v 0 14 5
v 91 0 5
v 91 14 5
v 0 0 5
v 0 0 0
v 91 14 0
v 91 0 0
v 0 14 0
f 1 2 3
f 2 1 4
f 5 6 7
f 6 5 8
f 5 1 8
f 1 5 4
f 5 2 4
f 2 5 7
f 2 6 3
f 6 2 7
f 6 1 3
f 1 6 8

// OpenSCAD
translate([3.5, 5.5, 2.5]) color([0.09890076646638046, 0.7328850061793606, 0.2487736956630997]) cube([7, 11, 5], center=true);
translate([10.5, 5.5, 2.5]) color([0.28455698400578255, 0.7360834330107994, 0.6596207917216363]) cube([7, 11, 5], center=true);
translate([17.5, 5.5, 2.5]) color([0.7419215555155583, 0.5152830587943614, 0.8590958196652707]) cube([7, 11, 5], center=true);
translate([24.5, 5.5, 2.5]) color([0.12179389137547159, 0.6451969614065052, 0.11824431248865597]) cube([7, 11, 5], center=true);
translate([31.5, 5.5, 2.5]) color([0.7372833681454282, 0.3589046614584527, 0.67488210437111]) cube([7, 11, 5], center=true);
translate([38.5, 5.5, 2.5]) color([0.7034839134412817, 0.6606084576410584, 0.22155798032782648]) cube([7, 11, 5], center=true);
translate([45.5, 5.5, 2.5]) color([0.8317998863873537, 0.24013608742346748, 0.5181532972121122]) cube([7, 11, 5], center=true);
translate([52.5, 5.5, 2.5]) color([0.6746457541533513, 0.23360317478475656, 0.628511722983939]) cube([7, 11, 5], center=true);
translate([59.5, 5.5, 2.5]) color([0.2868310479973286, 0.1713823760843869, 0.809748828526577]) cube([7, 11, 5], center=true);
translate([66.5, 5.5, 2.5]) color([0.5531227700773604, 0.32788470660885605, 0.5854309472055399]) cube([7, 11, 5], center=true);
translate([73.5, 5.5, 2.5]) color([0.025286397427288332, 0.12982285676032723, 0.3955808516982431]) cube([7, 11, 5], center=true);
translate([80.5, 5.5, 2.5]) color([0.9757565794644123, 0.5104745178761232, 0.07645620506689521]) cube([7, 11, 5], center=true);
translate([87.5, 5.5, 2.5]) color([0.7650406152494567, 0.7814438709253152, 0.7748021743948562]) cube([7, 11, 5], center=true);
translate([3.5, 12.5, 2.5]) color([0.5694980380479538, 0.6956987378694627, 0.21345793631163135]) cube([7, 3, 5], center=true);
translate([10.5, 12.5, 2.5]) color([0.7325605908939883, 0.8161739873415944, 0.7599665402219192]) cube([7, 3, 5], center=true);
translate([17.5, 12.5, 2.5]) color([0.353462402585887, 0.5910280505757086, 0.6289893574898388]) cube([7, 3, 5], center=true);
translate([24.5, 12.5, 2.5]) color([0.9008098536570839, 0.1080138952733335, 0.8339337708504084]) cube([7, 3, 5], center=true);
translate([31.5, 12.5, 2.5]) color([0.5264355584690392, 0.3586141205519373, 0.4556029014937524]) cube([7, 3, 5], center=true);
translate([38.5, 12.5, 2.5]) color([0.012635498930738787, 0.22007359233142765, 0.6527634200680049]) cube([7, 3, 5], center=true);
translate([45.5, 12.5, 2.5]) color([0.660849279754449, 0.4946989402863131, 0.9533258805973196]) cube([7, 3, 5], center=true);
translate([52.5, 12.5, 2.5]) color([0.4809150885494712, 0.3139436595456605, 0.8477808391956414]) cube([7, 3, 5], center=true);
translate([59.5, 12.5, 2.5]) color([0.259158299397262, 0.6043059930343495, 0.7034188523223]) cube([7, 3, 5], center=true);
translate([66.5, 12.5, 2.5]) color([0.8216962986917842, 0.7853687501827489, 0.3840923305137113]) cube([7, 3, 5], center=true);
translate([73.5, 12.5, 2.5]) color([0.059180305962736934, 0.03828786548344276, 0.7264603879084595]) cube([7, 3, 5], center=true);
translate([78.0, 12.5, 2.5]) color([0.9616913814068508, 0.3431653742712939, 0.44119509807551416]) cube([2, 3, 5], center=true);
translate([80.0, 12.5, 2.5]) color([0.7257980157417766, 0.6578312458538799, 0.26010658848413604]) cube([2, 3, 5], center=true);
translate([82.0, 12.5, 2.5]) color([0.6715848457987025, 0.3049024195743838, 0.3563579065620385]) cube([2, 3, 5], center=true);
translate([84.0, 12.5, 2.5]) color([0.5395133052630944, 0.7323138239267305, 0.15121621156796483]) cube([2, 3, 5], center=true);
translate([86.0, 12.5, 2.5]) color([0.021987210892938758, 0.6278299544850219, 0.024564677785836264]) cube([2, 3, 5], center=true);
translate([88.0, 12.5, 2.5]) color([0.04496324071616853, 0.22577557672213355, 0.6538768733044555]) cube([2, 3, 5], center=true);
translate([90.0, 12.5, 2.5]) color([0.06654509768602879, 0.06240576762652772, 0.9720932443736168]) cube([2, 3, 5], center=true);
